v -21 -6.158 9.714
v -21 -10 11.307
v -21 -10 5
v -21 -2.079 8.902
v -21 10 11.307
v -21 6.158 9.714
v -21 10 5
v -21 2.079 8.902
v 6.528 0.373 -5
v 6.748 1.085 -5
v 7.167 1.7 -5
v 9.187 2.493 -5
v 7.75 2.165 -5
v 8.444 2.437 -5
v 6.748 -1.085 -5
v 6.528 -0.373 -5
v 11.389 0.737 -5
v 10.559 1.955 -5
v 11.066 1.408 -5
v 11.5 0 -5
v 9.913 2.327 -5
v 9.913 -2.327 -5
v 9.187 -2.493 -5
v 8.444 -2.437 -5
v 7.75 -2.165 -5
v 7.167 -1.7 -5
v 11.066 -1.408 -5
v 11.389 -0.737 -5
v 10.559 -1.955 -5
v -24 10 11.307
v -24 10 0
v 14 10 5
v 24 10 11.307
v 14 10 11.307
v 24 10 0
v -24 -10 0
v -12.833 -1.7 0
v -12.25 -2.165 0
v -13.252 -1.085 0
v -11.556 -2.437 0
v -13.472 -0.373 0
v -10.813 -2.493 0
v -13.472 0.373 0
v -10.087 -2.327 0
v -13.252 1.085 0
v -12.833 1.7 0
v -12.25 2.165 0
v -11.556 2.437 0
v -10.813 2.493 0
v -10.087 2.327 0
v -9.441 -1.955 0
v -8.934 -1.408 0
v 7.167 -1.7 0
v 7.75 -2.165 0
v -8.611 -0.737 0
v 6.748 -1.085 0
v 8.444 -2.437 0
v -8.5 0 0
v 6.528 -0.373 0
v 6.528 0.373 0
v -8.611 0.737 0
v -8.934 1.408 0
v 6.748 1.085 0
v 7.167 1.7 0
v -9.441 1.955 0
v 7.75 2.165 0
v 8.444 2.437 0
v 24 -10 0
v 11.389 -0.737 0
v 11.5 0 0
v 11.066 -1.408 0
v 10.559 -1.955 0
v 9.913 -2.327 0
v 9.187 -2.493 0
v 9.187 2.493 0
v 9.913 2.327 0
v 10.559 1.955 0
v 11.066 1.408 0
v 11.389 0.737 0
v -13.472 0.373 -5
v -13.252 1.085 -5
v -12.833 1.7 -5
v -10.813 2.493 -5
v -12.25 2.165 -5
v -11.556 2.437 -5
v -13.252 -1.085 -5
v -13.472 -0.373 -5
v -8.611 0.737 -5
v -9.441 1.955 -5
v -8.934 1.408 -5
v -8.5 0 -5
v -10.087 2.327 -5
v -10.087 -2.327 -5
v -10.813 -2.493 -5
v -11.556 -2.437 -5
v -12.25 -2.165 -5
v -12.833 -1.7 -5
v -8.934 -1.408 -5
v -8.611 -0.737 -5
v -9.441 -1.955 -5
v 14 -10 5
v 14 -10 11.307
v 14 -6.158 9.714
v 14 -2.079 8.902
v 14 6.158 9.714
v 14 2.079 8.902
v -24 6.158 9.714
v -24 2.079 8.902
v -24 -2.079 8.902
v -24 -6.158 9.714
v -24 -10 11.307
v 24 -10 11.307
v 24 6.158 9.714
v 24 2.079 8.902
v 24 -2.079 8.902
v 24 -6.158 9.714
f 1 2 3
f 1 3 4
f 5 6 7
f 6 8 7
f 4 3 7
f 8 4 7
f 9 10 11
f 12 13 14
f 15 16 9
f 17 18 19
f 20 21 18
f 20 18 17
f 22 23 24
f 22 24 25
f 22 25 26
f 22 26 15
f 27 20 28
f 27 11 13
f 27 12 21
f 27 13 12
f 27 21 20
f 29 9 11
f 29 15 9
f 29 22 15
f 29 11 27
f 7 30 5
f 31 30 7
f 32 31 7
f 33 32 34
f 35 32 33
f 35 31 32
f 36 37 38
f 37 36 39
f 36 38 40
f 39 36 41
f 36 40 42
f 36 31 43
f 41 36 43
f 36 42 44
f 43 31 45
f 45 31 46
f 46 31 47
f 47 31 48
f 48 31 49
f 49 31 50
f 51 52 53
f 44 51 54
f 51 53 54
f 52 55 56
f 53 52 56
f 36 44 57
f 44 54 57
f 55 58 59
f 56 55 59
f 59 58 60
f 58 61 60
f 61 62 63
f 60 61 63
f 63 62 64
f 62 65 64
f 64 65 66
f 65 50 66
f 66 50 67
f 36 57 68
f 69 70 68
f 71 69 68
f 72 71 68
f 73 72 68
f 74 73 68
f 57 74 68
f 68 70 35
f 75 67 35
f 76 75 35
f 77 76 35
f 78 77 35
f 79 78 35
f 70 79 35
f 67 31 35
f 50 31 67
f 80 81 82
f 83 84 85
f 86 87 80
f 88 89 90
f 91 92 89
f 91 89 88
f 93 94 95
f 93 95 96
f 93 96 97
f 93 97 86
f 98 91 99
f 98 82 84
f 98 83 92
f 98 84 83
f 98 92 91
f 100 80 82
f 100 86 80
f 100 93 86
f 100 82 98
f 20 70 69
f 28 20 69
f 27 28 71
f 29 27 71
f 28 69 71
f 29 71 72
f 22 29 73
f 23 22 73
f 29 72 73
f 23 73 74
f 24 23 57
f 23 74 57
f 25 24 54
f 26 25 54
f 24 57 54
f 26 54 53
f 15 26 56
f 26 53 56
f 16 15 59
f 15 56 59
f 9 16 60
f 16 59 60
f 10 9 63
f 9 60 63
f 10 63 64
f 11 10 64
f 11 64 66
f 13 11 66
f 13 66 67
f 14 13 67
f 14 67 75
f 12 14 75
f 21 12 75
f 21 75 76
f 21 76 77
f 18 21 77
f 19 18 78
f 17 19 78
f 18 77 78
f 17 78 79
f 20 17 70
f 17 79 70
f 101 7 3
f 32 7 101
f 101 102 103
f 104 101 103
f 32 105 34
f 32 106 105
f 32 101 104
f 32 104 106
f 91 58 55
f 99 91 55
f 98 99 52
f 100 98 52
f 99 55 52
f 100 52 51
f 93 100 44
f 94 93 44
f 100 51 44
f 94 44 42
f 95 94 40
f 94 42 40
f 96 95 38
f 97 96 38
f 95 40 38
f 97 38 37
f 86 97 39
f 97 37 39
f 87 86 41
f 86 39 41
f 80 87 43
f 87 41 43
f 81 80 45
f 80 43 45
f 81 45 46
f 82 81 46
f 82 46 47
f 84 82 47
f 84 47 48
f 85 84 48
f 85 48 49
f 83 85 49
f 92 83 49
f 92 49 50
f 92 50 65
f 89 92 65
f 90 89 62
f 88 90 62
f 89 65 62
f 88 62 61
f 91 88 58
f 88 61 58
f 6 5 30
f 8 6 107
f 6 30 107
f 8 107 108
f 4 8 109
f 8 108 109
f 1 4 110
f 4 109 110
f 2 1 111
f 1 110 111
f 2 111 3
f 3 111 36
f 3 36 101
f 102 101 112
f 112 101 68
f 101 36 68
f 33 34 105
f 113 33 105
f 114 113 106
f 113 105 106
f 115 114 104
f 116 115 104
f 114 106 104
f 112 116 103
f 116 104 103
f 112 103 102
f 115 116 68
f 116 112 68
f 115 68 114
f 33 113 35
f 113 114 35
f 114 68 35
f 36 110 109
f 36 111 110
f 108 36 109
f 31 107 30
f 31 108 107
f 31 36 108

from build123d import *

# Parameters (mm, degrees)
SCHIZZO1_W                   = 48
SCHIZZO1_H                   = 20
ESTRUSIONE_ESTRUSIONE1_DEPTH = 5
SCHIZZO2_W                   = 3
SCHIZZO2_H                   = 20
SCHIZZO2_W_2                 = 10
ESTRUSIONE_ESTRUSIONE2_DEPTH = 25
TAGLIO_ESTRUSIONE1_REACH     = 59.48
SCHIZZO3_R                   = 21.2
SCHIZZO4_R                   = 2.5
ESTRUSIONE_ESTRUSIONE3_DEPTH = 5


with BuildPart() as part:
    # Schizzo1 → Estrusione-Estrusione1 (new body)
    with BuildSketch(Plane.XY):
        Rectangle(SCHIZZO1_W, SCHIZZO1_H)
    extrude(amount=ESTRUSIONE_ESTRUSIONE1_DEPTH)

    # Schizzo2 → Estrusione-Estrusione2 (add)
    with BuildSketch(Plane.XY.offset(5)):
        with Locations((-22.5, 0)):
            Rectangle(SCHIZZO2_W, SCHIZZO2_H)
        with Locations((19, 0)):
            Rectangle(SCHIZZO2_W_2, SCHIZZO2_H)
    extrude(amount=ESTRUSIONE_ESTRUSIONE2_DEPTH)

    # Taglio-Estrusione1: up to this face of the body (flat: up to its plane)
    taglio_estrusione1_end = Plane(part.part.faces().sort_by_distance((24, 0, 15))[0])
    # Schizzo3 → Taglio-Estrusione1 (cut, up to the picked face)
    with BuildSketch(Plane.ZY.offset(24), mode=Mode.PRIVATE) as taglio_estrusione1_sk1:
        with Locations((30, 0)):
            Circle(SCHIZZO3_R)
    taglio_estrusione1_tool1 = split(extrude(taglio_estrusione1_sk1.sketch, amount=-TAGLIO_ESTRUSIONE1_REACH, mode=Mode.PRIVATE), bisect_by=taglio_estrusione1_end, keep=Keep.BOTH, mode=Mode.PRIVATE)
    add(taglio_estrusione1_tool1.solids().sort_by(Axis((-24, 0, 30), (1, 0, 0)))[0], mode=Mode.SUBTRACT)

    # Schizzo4 → Estrusione-Estrusione3 (add)
    with BuildSketch(Plane(origin=(0, 0, 0), x_dir=(-1, 0, 0), z_dir=(0, 0, -1))):
        with Locations(Location((-9, 0, 0), (0, 0, 180))):
            Circle(SCHIZZO4_R)
        with Locations(Location((11, 0, 0), (0, 0, 180))):
            Circle(SCHIZZO4_R)
    extrude(amount=ESTRUSIONE_ESTRUSIONE3_DEPTH)


solid = part.part
